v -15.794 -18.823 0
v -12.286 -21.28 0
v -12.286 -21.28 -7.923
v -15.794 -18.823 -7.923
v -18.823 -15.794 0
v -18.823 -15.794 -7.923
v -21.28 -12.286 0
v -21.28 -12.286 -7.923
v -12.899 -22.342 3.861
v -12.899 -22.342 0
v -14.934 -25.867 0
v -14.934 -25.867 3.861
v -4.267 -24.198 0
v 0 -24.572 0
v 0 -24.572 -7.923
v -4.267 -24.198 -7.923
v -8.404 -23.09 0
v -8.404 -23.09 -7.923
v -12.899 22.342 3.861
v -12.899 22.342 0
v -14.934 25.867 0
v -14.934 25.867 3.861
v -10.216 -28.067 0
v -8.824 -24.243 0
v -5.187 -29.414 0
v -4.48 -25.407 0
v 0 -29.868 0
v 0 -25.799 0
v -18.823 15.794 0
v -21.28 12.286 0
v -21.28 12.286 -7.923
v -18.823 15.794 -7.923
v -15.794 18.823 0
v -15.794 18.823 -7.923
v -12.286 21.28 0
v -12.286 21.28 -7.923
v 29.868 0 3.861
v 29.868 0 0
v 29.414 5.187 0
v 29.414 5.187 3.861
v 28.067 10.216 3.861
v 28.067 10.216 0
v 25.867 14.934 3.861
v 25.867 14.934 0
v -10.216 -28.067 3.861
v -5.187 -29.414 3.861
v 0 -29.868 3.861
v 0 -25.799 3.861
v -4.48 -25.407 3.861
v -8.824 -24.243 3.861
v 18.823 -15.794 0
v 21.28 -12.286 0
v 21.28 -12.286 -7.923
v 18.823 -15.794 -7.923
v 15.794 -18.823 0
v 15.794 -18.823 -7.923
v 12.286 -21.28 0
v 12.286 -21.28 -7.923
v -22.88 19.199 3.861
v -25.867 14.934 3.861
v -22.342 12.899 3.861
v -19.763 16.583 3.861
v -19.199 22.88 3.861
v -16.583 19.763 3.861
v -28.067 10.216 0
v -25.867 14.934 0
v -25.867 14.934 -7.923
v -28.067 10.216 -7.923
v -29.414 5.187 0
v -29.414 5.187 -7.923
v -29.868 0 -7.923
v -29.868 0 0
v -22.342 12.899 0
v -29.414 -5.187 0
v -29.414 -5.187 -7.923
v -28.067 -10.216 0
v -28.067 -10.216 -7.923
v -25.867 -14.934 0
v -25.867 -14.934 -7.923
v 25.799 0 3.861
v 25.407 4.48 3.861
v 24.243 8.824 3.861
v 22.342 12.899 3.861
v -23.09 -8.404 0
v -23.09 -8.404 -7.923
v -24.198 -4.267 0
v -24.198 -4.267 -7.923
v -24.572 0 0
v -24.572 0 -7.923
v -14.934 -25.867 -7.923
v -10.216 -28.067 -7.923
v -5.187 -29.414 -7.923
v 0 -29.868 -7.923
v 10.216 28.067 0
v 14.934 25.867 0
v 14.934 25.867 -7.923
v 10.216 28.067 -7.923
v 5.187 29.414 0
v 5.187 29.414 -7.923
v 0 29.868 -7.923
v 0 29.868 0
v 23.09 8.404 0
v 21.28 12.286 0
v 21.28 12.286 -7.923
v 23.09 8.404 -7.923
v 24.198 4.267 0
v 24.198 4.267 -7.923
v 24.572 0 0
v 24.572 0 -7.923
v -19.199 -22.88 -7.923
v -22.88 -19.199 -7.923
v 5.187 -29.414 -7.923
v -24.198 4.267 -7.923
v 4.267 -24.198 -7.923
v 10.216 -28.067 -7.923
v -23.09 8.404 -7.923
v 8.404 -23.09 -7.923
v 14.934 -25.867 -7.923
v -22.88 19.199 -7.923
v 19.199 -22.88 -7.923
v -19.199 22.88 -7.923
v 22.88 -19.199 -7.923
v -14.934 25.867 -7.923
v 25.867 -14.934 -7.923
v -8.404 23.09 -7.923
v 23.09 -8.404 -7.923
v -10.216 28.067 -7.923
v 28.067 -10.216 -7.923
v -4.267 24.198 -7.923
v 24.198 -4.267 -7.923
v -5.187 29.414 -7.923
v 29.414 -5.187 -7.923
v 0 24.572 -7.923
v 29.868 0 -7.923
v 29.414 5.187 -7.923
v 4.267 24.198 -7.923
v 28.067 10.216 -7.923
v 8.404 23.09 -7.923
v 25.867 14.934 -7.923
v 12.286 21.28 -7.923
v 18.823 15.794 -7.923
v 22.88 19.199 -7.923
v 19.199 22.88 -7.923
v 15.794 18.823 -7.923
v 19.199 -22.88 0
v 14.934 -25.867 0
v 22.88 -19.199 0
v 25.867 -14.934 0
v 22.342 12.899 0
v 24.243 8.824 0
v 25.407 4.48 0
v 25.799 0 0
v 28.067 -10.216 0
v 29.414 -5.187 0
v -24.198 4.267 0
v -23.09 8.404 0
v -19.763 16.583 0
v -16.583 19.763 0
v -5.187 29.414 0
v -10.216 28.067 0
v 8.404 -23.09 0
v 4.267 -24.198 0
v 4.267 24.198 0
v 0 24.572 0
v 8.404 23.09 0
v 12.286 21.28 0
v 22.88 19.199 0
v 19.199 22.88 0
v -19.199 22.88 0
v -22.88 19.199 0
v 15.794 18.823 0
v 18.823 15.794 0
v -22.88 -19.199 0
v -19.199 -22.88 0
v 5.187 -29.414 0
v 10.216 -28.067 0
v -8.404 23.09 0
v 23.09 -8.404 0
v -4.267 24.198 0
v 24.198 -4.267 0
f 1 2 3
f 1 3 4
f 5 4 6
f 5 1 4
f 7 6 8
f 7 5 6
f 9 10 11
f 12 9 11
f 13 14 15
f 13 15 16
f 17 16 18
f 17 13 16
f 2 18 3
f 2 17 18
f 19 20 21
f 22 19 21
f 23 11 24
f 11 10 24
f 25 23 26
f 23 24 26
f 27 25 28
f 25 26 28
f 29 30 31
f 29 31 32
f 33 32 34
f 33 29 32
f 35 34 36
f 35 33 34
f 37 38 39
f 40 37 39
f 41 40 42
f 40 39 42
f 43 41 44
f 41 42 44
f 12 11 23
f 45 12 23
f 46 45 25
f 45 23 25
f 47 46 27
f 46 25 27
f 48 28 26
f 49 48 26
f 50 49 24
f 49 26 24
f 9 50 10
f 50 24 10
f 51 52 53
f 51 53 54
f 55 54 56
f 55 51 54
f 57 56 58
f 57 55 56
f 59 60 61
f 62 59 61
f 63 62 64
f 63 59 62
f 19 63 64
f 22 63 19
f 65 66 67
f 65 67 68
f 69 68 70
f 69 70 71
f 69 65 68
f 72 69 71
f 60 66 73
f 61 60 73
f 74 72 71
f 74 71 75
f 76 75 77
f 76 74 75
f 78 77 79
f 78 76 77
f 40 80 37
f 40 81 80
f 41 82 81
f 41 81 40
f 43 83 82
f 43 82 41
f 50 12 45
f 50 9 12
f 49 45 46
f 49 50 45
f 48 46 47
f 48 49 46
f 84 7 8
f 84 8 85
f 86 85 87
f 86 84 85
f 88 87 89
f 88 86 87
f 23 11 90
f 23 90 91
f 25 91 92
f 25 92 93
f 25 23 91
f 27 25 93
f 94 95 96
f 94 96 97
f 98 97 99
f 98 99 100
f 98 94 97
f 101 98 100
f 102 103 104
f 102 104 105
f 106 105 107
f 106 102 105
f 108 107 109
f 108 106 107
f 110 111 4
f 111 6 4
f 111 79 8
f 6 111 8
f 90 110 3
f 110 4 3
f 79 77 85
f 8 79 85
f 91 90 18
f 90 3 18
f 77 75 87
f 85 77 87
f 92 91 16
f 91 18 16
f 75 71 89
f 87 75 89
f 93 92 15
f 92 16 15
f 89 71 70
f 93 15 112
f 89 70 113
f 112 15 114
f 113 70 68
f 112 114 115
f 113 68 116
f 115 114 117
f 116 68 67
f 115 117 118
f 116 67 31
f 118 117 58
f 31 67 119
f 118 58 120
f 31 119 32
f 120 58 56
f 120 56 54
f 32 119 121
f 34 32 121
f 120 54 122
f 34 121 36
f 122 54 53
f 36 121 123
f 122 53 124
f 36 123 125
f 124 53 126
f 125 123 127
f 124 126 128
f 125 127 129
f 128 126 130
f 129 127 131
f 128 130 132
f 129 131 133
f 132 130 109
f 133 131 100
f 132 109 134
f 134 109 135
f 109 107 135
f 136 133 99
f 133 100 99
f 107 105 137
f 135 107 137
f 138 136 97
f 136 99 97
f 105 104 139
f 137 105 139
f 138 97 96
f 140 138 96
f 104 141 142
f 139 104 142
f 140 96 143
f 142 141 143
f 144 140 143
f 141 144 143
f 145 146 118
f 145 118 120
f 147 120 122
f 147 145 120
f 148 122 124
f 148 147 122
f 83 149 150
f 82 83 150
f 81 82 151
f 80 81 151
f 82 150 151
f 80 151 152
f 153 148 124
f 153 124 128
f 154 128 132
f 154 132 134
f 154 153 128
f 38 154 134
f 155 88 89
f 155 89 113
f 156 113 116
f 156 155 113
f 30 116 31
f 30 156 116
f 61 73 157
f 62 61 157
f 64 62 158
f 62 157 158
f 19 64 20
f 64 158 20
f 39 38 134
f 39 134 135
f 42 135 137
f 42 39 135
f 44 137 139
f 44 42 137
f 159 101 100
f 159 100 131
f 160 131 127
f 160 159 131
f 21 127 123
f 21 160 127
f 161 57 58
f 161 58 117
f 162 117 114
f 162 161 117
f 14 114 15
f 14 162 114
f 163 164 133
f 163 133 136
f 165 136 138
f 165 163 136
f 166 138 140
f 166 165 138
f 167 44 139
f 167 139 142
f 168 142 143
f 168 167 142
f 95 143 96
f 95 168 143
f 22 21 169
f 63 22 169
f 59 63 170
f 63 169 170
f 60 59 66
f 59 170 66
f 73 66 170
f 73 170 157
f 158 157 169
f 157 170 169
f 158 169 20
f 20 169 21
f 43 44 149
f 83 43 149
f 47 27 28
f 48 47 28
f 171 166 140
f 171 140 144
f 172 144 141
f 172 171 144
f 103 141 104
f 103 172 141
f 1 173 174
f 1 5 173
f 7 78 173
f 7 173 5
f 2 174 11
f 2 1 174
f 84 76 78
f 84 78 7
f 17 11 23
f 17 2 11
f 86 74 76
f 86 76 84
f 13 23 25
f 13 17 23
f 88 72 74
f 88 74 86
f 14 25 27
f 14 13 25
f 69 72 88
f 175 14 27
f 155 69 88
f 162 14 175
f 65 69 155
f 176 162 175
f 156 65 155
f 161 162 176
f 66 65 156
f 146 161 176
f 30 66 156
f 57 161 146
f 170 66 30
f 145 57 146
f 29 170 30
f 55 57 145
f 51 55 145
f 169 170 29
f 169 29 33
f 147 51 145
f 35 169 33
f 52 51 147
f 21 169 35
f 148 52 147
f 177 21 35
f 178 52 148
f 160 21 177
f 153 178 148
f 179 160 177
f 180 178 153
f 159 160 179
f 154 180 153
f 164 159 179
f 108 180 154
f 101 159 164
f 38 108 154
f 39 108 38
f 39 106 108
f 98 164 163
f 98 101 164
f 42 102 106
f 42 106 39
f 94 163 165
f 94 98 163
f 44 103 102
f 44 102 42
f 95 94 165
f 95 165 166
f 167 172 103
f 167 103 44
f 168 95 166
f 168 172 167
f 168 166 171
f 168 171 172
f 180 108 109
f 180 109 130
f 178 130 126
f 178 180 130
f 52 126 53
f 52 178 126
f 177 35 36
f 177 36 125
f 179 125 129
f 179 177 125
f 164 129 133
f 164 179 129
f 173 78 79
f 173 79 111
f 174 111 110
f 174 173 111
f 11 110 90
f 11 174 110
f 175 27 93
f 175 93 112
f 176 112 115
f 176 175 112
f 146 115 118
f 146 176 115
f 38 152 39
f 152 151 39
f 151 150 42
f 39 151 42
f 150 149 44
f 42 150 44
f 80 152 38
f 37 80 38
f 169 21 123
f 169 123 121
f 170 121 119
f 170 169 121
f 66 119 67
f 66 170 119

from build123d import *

# Parameters (mm, degrees)
F1_DEPTH = 3.8606161252
F2_DEPTH = 7.9230344854


with BuildPart() as f1:
    # F0 (on Top) → F1 (new body)
    with BuildSketch(Plane.XY):
        with BuildLine():
            Line((25.7986287249, 0), (29.8681490033, 0))
            ThreePointArc((29.8681490033, 0), (28.8504165057, 7.730445804), (25.8665758009, 14.9340745016))
            Line((25.8665758009, 14.9340745016), (22.3422678585, 12.8993143624))
            ThreePointArc((22.3422678585, 12.8993143624), (24.9195617682, 6.6771764515), (25.7986287249, 0))
        make_face()
    extrude(amount=F1_DEPTH)


with BuildPart() as f1b:
    # F0 (on Top) → F1, piece 2 (new body)
    with BuildSketch(Plane.XY):
        with BuildLine():
            Line((-12.8993143624, 22.3422678585), (-14.9340745016, 25.8665758009))
            ThreePointArc((-14.9340745016, 25.8665758009), (-21.1199707017, 21.1199707017), (-25.8665758009, 14.9340745016))
            Line((-25.8665758009, 14.9340745016), (-22.3422678585, 12.8993143624))
            ThreePointArc((-22.3422678585, 12.8993143624), (-18.2423853167, 18.2423853167), (-12.8993143624, 22.3422678585))
        make_face()
    extrude(amount=F1_DEPTH)


with BuildPart() as f1c:
    # F0 (on Top) → F1, piece 3 (new body)
    with BuildSketch(Plane.XY):
        with BuildLine():
            ThreePointArc((-14.9340745016, -25.8665758009), (-7.730445804, -28.8504165057), (0, -29.8681490033))
            Line((0, -29.8681490033), (0, -25.7986287249))
            ThreePointArc((0, -25.7986287249), (-6.6771764515, -24.9195617682), (-12.8993143624, -22.3422678585))
            Line((-12.8993143624, -22.3422678585), (-14.9340745016, -25.8665758009))
        make_face()
    extrude(amount=F1_DEPTH)


with BuildPart() as f2:
    # F0 (on Top) → F2 (new body)
    with BuildSketch(Plane.XY):
        with BuildLine():
            ThreePointArc((-29.8681490033, 0), (-28.8504165057, -7.730445804), (-25.8665758009, -14.9340745016))
            Line((-25.8665758009, -14.9340745016), (-22.3422678585, -12.8993143624))
            ThreePointArc((-22.3422678585, -12.8993143624), (-24.9195617682, -6.6771764515), (-25.7986287249, 0))
            Line((-25.7986287249, 0), (-29.8681490033, 0))
        make_face()
        with BuildLine():
            ThreePointArc((-21.2796921999, -12.2858360199), (-23.7344126183, -6.3596166939), (-24.5716720398, 0))
            Line((-24.5716720398, 0), (-25.7986287249, 0))
            ThreePointArc((-25.7986287249, 0), (-24.9195617682, -6.6771764515), (-22.3422678585, -12.8993143624))
            Line((-22.3422678585, -12.8993143624), (-21.2796921999, -12.2858360199))
        make_face()
        with BuildLine():
            ThreePointArc((-25.8665758009, -14.9340745016), (-21.1199707017, -21.1199707017), (-14.9340745016, -25.8665758009))
            Line((-14.9340745016, -25.8665758009), (-12.8993143624, -22.3422678585))
            ThreePointArc((-12.8993143624, -22.3422678585), (-18.2423853167, -18.2423853167), (-22.3422678585, -12.8993143624))
            Line((-22.3422678585, -12.8993143624), (-25.8665758009, -14.9340745016))
        make_face()
        with BuildLine():
            ThreePointArc((-12.2858360199, -21.2796921999), (-17.3747959244, -17.3747959244), (-21.2796921999, -12.2858360199))
            Line((-21.2796921999, -12.2858360199), (-22.3422678585, -12.8993143624))
            ThreePointArc((-22.3422678585, -12.8993143624), (-18.2423853167, -18.2423853167), (-12.8993143624, -22.3422678585))
            Line((-12.8993143624, -22.3422678585), (-12.2858360199, -21.2796921999))
        make_face()
        with BuildLine():
            ThreePointArc((-12.8993143624, -22.3422678585), (-6.6771764515, -24.9195617682), (0, -25.7986287249))
            Line((0, -25.7986287249), (0, -24.5716720398))
            ThreePointArc((0, -24.5716720398), (-6.3596166939, -23.7344126183), (-12.2858360199, -21.2796921999))
            Line((-12.2858360199, -21.2796921999), (-12.8993143624, -22.3422678585))
        make_face()
        with BuildLine():
            ThreePointArc((-14.9340745016, -25.8665758009), (-7.730445804, -28.8504165057), (0, -29.8681490033))
            Line((0, -29.8681490033), (0, -25.7986287249))
            ThreePointArc((0, -25.7986287249), (-6.6771764515, -24.9195617682), (-12.8993143624, -22.3422678585))
            Line((-12.8993143624, -22.3422678585), (-14.9340745016, -25.8665758009))
        make_face()
        with BuildLine():
            ThreePointArc((0, -29.8681490033), (7.730445804, -28.8504165057), (14.9340745016, -25.8665758009))
            Line((14.9340745016, -25.8665758009), (12.8993143624, -22.3422678585))
            ThreePointArc((12.8993143624, -22.3422678585), (6.6771764515, -24.9195617682), (0, -25.7986287249))
            Line((0, -25.7986287249), (0, -29.8681490033))
        make_face()
        with BuildLine():
            ThreePointArc((0, -25.7986287249), (6.6771764515, -24.9195617682), (12.8993143624, -22.3422678585))
            Line((12.8993143624, -22.3422678585), (12.2858360199, -21.2796921999))
            ThreePointArc((12.2858360199, -21.2796921999), (6.3596166939, -23.7344126183), (0, -24.5716720398))
            Line((0, -24.5716720398), (0, -25.7986287249))
        make_face()
        with BuildLine():
            ThreePointArc((14.9340745016, -25.8665758009), (21.1199707017, -21.1199707017), (25.8665758009, -14.9340745016))
            Line((25.8665758009, -14.9340745016), (22.3422678585, -12.8993143624))
            ThreePointArc((22.3422678585, -12.8993143624), (18.2423853167, -18.2423853167), (12.8993143624, -22.3422678585))
            Line((12.8993143624, -22.3422678585), (14.9340745016, -25.8665758009))
        make_face()
        with BuildLine():
            ThreePointArc((12.8993143624, -22.3422678585), (18.2423853167, -18.2423853167), (22.3422678585, -12.8993143624))
            Line((22.3422678585, -12.8993143624), (21.2796921999, -12.2858360199))
            ThreePointArc((21.2796921999, -12.2858360199), (17.3747959244, -17.3747959244), (12.2858360199, -21.2796921999))
            Line((12.2858360199, -21.2796921999), (12.8993143624, -22.3422678585))
        make_face()
        with BuildLine():
            ThreePointArc((22.3422678585, -12.8993143624), (24.9195617682, -6.6771764515), (25.7986287249, 0))
            Line((25.7986287249, 0), (24.5716720398, 0))
            ThreePointArc((24.5716720398, 0), (23.7344126183, -6.3596166939), (21.2796921999, -12.2858360199))
            Line((21.2796921999, -12.2858360199), (22.3422678585, -12.8993143624))
        make_face()
        with BuildLine():
            ThreePointArc((25.8665758009, -14.9340745016), (28.8504165057, -7.730445804), (29.8681490033, 0))
            Line((29.8681490033, 0), (25.7986287249, 0))
            ThreePointArc((25.7986287249, 0), (24.9195617682, -6.6771764515), (22.3422678585, -12.8993143624))
            Line((22.3422678585, -12.8993143624), (25.8665758009, -14.9340745016))
        make_face()
        with BuildLine():
            Line((25.7986287249, 0), (29.8681490033, 0))
            ThreePointArc((29.8681490033, 0), (28.8504165057, 7.730445804), (25.8665758009, 14.9340745016))
            Line((25.8665758009, 14.9340745016), (22.3422678585, 12.8993143624))
            ThreePointArc((22.3422678585, 12.8993143624), (24.9195617682, 6.6771764515), (25.7986287249, 0))
        make_face()
        with BuildLine():
            Line((-12.8993143624, 22.3422678585), (-14.9340745016, 25.8665758009))
            ThreePointArc((-14.9340745016, 25.8665758009), (-21.1199707017, 21.1199707017), (-25.8665758009, 14.9340745016))
            Line((-25.8665758009, 14.9340745016), (-22.3422678585, 12.8993143624))
            ThreePointArc((-22.3422678585, 12.8993143624), (-18.2423853167, 18.2423853167), (-12.8993143624, 22.3422678585))
        make_face()
        with BuildLine():
            Line((22.3422678585, 12.8993143624), (25.8665758009, 14.9340745016))
            ThreePointArc((25.8665758009, 14.9340745016), (21.1199707017, 21.1199707017), (14.9340745016, 25.8665758009))
            Line((14.9340745016, 25.8665758009), (12.8993143624, 22.3422678585))
            ThreePointArc((12.8993143624, 22.3422678585), (18.2423853167, 18.2423853167), (22.3422678585, 12.8993143624))
        make_face()
        with BuildLine():
            Line((12.8993143624, 22.3422678585), (14.9340745016, 25.8665758009))
            ThreePointArc((14.9340745016, 25.8665758009), (7.730445804, 28.8504165057), (0, 29.8681490033))
            Line((0, 29.8681490033), (0, 25.7986287249))
            ThreePointArc((0, 25.7986287249), (6.6771764515, 24.9195617682), (12.8993143624, 22.3422678585))
        make_face()
        with BuildLine():
            Line((0, 25.7986287249), (0, 29.8681490033))
            ThreePointArc((0, 29.8681490033), (-7.730445804, 28.8504165057), (-14.9340745016, 25.8665758009))
            Line((-14.9340745016, 25.8665758009), (-12.8993143624, 22.3422678585))
            ThreePointArc((-12.8993143624, 22.3422678585), (-6.6771764515, 24.9195617682), (0, 25.7986287249))
        make_face()
        with BuildLine():
            Line((-22.3422678585, 12.8993143624), (-25.8665758009, 14.9340745016))
            ThreePointArc((-25.8665758009, 14.9340745016), (-28.8504165057, 7.730445804), (-29.8681490033, 0))
            Line((-29.8681490033, 0), (-25.7986287249, 0))
            ThreePointArc((-25.7986287249, 0), (-24.9195617682, 6.6771764515), (-22.3422678585, 12.8993143624))
        make_face()
        with BuildLine():
            ThreePointArc((-24.5716720398, 0), (-23.7344126183, 6.3596166939), (-21.2796921999, 12.2858360199))
            Line((-21.2796921999, 12.2858360199), (-22.3422678585, 12.8993143624))
            ThreePointArc((-22.3422678585, 12.8993143624), (-24.9195617682, 6.6771764515), (-25.7986287249, 0))
            Line((-25.7986287249, 0), (-24.5716720398, 0))
        make_face()
        with BuildLine():
            ThreePointArc((-21.2796921999, 12.2858360199), (-17.3747959244, 17.3747959244), (-12.2858360199, 21.2796921999))
            Line((-12.2858360199, 21.2796921999), (-12.8993143624, 22.3422678585))
            ThreePointArc((-12.8993143624, 22.3422678585), (-18.2423853167, 18.2423853167), (-22.3422678585, 12.8993143624))
            Line((-22.3422678585, 12.8993143624), (-21.2796921999, 12.2858360199))
        make_face()
        with BuildLine():
            Line((0, 24.5716720398), (0, 25.7986287249))
            ThreePointArc((0, 25.7986287249), (-6.6771764515, 24.9195617682), (-12.8993143624, 22.3422678585))
            Line((-12.8993143624, 22.3422678585), (-12.2858360199, 21.2796921999))
            ThreePointArc((-12.2858360199, 21.2796921999), (-6.3596166939, 23.7344126183), (0, 24.5716720398))
        make_face()
        with BuildLine():
            Line((12.2858360199, 21.2796921999), (12.8993143624, 22.3422678585))
            ThreePointArc((12.8993143624, 22.3422678585), (6.6771764515, 24.9195617682), (0, 25.7986287249))
            Line((0, 25.7986287249), (0, 24.5716720398))
            ThreePointArc((0, 24.5716720398), (6.3596166939, 23.7344126183), (12.2858360199, 21.2796921999))
        make_face()
        with BuildLine():
            Line((21.2796921999, 12.2858360199), (22.3422678585, 12.8993143624))
            ThreePointArc((22.3422678585, 12.8993143624), (18.2423853167, 18.2423853167), (12.8993143624, 22.3422678585))
            Line((12.8993143624, 22.3422678585), (12.2858360199, 21.2796921999))
            ThreePointArc((12.2858360199, 21.2796921999), (17.3747959244, 17.3747959244), (21.2796921999, 12.2858360199))
        make_face()
        with BuildLine():
            Line((24.5716720398, 0), (25.7986287249, 0))
            ThreePointArc((25.7986287249, 0), (24.9195617682, 6.6771764515), (22.3422678585, 12.8993143624))
            Line((22.3422678585, 12.8993143624), (21.2796921999, 12.2858360199))
            ThreePointArc((21.2796921999, 12.2858360199), (23.7344126183, 6.3596166939), (24.5716720398, 0))
        make_face()
    extrude(amount=-F2_DEPTH)


solid = Compound([f1.part, f1b.part, f1c.part, f2.part])
